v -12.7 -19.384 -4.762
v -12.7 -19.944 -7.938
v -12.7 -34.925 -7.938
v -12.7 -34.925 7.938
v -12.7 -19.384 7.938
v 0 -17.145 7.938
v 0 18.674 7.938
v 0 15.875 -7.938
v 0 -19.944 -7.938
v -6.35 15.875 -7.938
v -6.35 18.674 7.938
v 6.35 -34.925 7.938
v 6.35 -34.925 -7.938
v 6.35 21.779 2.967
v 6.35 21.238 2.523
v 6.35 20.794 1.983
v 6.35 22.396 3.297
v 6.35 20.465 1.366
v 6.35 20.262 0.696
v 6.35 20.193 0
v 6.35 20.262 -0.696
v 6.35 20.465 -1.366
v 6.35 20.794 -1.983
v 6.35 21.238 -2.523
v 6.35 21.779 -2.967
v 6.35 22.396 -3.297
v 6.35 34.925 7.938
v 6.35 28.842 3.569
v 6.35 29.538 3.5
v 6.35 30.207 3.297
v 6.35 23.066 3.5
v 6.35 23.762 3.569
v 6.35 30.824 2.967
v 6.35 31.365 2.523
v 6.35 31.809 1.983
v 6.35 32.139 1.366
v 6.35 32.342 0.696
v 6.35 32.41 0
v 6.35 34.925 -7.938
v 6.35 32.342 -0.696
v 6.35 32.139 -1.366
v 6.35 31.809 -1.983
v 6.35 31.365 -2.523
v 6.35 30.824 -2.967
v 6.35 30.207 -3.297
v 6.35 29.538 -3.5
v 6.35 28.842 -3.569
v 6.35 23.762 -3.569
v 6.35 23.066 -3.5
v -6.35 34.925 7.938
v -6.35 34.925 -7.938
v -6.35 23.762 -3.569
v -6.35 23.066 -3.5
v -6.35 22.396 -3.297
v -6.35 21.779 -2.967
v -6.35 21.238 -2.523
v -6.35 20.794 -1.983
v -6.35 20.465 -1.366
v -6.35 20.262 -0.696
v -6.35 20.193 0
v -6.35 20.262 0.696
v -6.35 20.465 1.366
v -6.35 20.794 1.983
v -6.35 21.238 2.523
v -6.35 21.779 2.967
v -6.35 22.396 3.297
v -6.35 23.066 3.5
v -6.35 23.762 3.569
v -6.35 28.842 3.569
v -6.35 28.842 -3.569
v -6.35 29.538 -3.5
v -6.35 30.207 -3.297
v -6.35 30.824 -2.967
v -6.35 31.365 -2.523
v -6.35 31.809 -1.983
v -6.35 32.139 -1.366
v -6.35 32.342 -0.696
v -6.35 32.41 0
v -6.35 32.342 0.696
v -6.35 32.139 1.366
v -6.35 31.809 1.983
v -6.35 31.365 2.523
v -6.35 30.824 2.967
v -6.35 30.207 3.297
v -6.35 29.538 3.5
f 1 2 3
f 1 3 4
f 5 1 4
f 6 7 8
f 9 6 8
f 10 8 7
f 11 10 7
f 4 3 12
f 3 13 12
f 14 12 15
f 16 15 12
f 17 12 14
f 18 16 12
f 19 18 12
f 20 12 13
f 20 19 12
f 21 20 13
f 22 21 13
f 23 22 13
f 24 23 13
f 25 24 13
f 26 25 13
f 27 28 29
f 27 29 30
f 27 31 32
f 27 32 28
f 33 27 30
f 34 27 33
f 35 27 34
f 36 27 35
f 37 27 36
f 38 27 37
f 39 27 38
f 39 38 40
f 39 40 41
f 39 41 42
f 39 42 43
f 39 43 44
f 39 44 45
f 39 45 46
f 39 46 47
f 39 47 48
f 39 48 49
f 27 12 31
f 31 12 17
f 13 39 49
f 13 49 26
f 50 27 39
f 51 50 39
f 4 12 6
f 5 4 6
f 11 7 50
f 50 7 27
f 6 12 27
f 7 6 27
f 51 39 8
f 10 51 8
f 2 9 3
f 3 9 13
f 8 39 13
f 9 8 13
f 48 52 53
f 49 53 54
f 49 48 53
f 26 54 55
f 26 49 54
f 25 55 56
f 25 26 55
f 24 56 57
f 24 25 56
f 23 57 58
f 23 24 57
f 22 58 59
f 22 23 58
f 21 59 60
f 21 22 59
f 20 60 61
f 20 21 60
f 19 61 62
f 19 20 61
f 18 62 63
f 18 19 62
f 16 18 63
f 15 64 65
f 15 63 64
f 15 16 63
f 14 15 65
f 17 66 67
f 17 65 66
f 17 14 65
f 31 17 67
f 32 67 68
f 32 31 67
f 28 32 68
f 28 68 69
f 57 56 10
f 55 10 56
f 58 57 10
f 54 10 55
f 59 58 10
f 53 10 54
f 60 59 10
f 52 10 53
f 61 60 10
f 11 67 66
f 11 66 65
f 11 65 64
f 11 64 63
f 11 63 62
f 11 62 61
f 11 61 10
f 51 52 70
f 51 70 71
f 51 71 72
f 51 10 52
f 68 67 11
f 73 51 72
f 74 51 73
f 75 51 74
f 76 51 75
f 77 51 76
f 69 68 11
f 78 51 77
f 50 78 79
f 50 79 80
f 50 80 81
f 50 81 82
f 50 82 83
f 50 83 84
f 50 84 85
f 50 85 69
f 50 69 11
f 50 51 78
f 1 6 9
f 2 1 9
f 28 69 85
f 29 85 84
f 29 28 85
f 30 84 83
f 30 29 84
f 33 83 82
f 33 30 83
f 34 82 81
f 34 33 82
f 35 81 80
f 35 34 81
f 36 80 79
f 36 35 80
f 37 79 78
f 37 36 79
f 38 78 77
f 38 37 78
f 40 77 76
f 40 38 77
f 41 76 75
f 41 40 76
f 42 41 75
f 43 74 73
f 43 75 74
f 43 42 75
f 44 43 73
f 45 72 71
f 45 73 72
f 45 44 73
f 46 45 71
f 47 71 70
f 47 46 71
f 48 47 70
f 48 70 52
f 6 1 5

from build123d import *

# Parameters (mm, degrees)
SKETCH1_W           = 15.875
SKETCH1_H           = 69.85
BOSS_EXTRUDE1_DEPTH = 6.35
BOSS_EXTRUDE2_DEPTH = 6.35
BOSS_EXTRUDE3_DEPTH = 12.7
CUT_EXTRUDE1_DEPTH  = 41.411152545
CUT_EXTRUDE2_DEPTH  = 41.566760177


with BuildPart() as part:
    # Sketch1 → Boss-Extrude1 (new body)
    with BuildSketch(Plane(origin=(0, 0, 0), x_dir=(0, 0, -1), z_dir=(1, 0, 0))):
        Rectangle(SKETCH1_W, SKETCH1_H)
    extrude(amount=BOSS_EXTRUDE1_DEPTH)

    # Sketch2 → Boss-Extrude2 (add)
    with BuildSketch(Plane.ZY):
        Polygon((7.9375, 34.925), (-7.9375, 34.925), (-7.9375, 15.875), (7.9375, 18.674190819), align=None)
    extrude(amount=BOSS_EXTRUDE2_DEPTH)

    # Sketch3 → Boss-Extrude3 (add)
    with BuildSketch(Plane.ZY):
        Polygon((-7.9375, -19.944190819), (-7.9375, -34.925), (7.9375, -34.925), (7.9375, -17.145), align=None)
    extrude(amount=BOSS_EXTRUDE3_DEPTH)

    # Sketch6 → Cut-Extrude1 (cut, through all)
    with BuildSketch(Plane(origin=(0, 0, -7.9375), x_dir=(-1, 0, 0), z_dir=(0, 0, -1))):
        Polygon((0, -17.145), (12.7, -17.145), (12.7, -19.384352655), align=None)
    extrude(amount=-CUT_EXTRUDE1_DEPTH, mode=Mode.SUBTRACT)

    # Sketch7 → Cut-Extrude2 (cut, through all)
    with BuildSketch(Plane(origin=(6.35, 0, 0), x_dir=(0, 0, -1), z_dir=(1, 0, 0))):
        with BuildLine():
            Line((3.5687, 28.841737989), (3.5687, 23.761737989))
            ThreePointArc((3.5687, 23.761737989), (0, 20.193037989), (-3.5687, 23.761737989))
            Line((-3.5687, 23.761737989), (-3.5687, 28.841737989))
            ThreePointArc((-3.5687, 28.841737989), (0, 32.410437989), (3.5687, 28.841737989))
        make_face()
    extrude(amount=-CUT_EXTRUDE2_DEPTH, mode=Mode.SUBTRACT)


solid = part.part
